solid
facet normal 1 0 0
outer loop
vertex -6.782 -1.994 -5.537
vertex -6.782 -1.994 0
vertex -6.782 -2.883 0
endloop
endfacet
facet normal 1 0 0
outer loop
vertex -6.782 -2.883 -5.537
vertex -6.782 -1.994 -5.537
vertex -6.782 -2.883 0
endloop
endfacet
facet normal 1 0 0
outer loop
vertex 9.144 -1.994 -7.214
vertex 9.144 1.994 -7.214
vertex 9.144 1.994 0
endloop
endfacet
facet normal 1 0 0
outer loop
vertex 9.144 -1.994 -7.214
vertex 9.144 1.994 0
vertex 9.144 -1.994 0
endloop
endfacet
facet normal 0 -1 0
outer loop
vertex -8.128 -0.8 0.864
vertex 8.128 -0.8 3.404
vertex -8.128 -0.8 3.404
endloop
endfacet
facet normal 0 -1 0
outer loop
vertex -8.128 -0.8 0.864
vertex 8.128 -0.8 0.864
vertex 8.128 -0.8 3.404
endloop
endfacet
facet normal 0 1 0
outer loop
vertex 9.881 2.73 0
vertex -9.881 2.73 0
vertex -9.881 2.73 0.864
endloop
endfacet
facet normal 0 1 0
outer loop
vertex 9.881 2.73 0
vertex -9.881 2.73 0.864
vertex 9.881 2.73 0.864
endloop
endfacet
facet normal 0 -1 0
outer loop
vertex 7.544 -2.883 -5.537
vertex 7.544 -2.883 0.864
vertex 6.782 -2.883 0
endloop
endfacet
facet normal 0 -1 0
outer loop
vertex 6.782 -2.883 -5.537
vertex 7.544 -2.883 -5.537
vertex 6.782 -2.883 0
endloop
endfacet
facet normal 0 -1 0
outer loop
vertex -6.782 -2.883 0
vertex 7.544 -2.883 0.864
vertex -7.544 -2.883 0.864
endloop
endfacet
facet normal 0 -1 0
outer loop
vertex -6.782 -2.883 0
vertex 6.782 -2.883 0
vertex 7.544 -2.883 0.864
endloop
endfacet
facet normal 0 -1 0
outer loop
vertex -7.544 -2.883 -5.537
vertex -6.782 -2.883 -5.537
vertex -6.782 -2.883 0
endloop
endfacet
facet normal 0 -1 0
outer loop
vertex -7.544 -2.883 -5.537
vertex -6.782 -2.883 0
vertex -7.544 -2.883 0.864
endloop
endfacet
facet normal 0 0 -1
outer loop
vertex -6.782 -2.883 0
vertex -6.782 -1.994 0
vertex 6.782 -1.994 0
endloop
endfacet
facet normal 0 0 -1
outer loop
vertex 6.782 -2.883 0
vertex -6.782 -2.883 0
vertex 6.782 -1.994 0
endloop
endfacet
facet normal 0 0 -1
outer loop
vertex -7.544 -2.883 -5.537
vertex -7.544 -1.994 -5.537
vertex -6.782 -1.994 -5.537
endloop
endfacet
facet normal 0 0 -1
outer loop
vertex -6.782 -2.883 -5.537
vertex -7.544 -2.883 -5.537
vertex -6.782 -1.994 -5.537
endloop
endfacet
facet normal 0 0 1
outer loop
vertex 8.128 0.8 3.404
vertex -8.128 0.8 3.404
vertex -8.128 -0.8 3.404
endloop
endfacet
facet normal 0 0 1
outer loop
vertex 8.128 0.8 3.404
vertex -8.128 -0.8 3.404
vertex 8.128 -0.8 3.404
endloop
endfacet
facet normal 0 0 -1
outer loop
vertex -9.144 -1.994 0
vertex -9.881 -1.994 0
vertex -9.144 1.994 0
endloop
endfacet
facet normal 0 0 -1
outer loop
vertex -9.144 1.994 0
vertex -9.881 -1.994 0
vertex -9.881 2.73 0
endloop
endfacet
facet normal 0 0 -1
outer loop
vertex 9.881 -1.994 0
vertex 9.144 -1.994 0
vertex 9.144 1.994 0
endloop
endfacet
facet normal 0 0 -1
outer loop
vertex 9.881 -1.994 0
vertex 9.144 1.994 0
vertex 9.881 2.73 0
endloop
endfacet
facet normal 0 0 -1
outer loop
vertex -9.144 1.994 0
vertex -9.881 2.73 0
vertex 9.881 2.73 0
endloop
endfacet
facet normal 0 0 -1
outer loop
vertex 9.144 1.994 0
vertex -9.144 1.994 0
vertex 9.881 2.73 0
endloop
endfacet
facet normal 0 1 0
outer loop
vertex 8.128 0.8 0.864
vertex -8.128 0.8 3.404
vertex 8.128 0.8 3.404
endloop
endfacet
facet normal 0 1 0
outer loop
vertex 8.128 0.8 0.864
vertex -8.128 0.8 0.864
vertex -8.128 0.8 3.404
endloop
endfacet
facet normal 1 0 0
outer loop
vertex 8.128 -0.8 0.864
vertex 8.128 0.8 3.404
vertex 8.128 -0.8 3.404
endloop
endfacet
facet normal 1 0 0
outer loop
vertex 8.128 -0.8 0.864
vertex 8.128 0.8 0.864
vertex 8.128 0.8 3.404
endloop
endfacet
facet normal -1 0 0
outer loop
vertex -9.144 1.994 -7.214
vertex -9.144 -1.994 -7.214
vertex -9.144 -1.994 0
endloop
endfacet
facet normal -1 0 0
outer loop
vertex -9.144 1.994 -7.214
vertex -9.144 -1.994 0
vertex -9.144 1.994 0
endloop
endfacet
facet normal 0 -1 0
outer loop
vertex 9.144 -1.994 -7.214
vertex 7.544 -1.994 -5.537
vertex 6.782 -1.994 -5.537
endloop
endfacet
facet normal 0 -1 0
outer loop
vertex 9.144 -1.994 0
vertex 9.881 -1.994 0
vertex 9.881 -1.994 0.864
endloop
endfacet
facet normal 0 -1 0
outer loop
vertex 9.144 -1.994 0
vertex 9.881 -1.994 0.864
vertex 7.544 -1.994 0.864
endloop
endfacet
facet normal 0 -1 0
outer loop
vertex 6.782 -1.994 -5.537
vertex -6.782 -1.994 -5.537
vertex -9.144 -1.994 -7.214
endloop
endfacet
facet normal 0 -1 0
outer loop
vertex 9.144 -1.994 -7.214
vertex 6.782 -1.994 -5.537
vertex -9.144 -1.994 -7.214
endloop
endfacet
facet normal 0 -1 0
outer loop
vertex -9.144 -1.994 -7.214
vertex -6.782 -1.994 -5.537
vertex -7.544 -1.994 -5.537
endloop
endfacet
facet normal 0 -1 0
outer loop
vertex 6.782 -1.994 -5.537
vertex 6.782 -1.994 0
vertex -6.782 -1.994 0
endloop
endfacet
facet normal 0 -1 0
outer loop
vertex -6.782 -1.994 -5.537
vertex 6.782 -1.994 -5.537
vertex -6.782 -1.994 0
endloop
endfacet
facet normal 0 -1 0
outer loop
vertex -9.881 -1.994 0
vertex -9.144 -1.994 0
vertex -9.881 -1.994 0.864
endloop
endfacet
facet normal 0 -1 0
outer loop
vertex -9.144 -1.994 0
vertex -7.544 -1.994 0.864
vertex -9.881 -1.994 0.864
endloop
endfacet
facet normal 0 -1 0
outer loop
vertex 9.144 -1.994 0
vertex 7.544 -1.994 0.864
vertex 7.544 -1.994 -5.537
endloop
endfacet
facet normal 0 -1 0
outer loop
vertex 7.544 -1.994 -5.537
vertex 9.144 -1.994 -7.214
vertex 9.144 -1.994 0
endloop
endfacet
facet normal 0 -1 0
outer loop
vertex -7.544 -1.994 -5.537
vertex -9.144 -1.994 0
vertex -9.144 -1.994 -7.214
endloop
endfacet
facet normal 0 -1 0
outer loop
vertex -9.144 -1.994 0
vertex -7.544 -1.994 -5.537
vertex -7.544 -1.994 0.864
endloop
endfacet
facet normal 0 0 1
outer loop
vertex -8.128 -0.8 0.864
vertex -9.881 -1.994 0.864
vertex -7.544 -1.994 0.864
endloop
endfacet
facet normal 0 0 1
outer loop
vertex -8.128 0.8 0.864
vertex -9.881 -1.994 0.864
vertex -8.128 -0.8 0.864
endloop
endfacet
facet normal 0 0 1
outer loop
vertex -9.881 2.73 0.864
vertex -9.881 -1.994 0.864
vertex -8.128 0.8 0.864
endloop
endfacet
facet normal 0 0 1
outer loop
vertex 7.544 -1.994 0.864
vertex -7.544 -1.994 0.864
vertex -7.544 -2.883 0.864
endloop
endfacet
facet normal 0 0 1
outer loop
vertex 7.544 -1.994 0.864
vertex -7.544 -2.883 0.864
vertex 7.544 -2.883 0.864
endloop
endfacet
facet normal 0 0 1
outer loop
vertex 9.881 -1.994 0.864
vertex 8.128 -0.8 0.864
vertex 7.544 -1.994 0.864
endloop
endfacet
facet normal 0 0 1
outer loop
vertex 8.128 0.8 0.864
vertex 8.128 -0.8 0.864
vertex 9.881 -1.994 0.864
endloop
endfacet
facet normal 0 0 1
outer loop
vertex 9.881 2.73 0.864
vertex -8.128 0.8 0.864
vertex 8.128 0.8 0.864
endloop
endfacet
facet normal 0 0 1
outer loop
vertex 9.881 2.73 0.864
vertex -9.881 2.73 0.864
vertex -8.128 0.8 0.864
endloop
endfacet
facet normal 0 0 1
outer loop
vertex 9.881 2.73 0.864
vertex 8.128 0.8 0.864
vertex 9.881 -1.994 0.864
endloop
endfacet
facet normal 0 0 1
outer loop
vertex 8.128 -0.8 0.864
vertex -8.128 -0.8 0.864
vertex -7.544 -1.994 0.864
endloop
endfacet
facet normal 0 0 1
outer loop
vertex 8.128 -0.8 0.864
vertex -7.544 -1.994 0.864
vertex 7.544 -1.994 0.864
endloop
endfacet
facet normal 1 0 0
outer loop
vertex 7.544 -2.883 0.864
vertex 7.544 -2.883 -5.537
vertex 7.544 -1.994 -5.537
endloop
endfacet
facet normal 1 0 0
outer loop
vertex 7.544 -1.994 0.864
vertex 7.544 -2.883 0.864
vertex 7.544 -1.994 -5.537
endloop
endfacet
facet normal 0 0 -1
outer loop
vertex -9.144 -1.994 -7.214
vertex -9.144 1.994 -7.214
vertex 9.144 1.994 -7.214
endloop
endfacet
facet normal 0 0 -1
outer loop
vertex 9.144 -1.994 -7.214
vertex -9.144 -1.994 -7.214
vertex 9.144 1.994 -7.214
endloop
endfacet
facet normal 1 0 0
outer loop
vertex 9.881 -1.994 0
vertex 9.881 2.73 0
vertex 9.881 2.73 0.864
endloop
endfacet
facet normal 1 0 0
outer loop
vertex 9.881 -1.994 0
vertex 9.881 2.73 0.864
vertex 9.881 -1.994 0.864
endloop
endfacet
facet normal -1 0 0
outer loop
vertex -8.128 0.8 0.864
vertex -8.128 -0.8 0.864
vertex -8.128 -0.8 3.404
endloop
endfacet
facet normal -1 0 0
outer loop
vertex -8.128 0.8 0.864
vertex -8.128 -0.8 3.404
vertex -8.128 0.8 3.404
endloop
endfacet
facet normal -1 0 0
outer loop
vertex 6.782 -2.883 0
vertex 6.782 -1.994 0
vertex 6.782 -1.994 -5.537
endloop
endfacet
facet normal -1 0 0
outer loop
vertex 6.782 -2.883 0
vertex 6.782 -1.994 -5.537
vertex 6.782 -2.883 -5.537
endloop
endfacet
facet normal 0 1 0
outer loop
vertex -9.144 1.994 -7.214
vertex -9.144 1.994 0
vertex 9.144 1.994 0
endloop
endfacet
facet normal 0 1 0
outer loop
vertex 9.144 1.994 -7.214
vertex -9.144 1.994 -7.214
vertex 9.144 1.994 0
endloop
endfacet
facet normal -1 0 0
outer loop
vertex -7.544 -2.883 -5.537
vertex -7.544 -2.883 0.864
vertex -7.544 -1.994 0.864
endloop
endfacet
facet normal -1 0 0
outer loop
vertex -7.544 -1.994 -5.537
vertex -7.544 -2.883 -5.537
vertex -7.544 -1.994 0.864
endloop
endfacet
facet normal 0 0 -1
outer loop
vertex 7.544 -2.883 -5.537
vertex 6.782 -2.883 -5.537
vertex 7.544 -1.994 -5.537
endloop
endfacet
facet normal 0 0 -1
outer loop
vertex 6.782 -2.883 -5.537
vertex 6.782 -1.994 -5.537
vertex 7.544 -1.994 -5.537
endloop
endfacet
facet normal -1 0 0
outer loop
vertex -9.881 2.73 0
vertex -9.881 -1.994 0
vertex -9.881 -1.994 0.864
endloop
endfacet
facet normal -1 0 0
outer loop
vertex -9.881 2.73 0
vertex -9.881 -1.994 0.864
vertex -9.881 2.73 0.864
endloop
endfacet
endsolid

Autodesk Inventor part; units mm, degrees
ref_plane "YZ Plane" through (0, 0, 0) normal (1, 0, 0) x (0, 1, 0)
ref_plane "XZ Plane" through (0, 0, 0) normal (0, 1, 0) x (-1, 0, 0)
ref_plane "XY Plane" through (0, 0, 0) normal (0, 0, 1) x (1, 0, 0)
sketch "Sketch1" plane through (0, 0, 0) normal (0, 0, 1) x (1, 0, 0)
  line L0 (-9.144, 1.9939) -> (9.144, 1.9939)
  line L1 (9.144, 1.9939) -> (9.144, -1.9939)
  line L2 (9.144, -1.9939) -> (-9.144, -1.9939)
  line L3 (-9.144, -1.9939) -> (-9.144, 1.9939)
  line L4 (-9.144, 1.9939) -> (9.144, -1.9939) construction
  line L5 (9.144, 1.9939) -> (-9.144, -1.9939) construction
  line L6 (-9.8806, 2.7305) -> (9.8806, 2.7305)
  line L7 (9.8806, 2.7305) -> (9.8806, -1.9939)
  line L8 (9.8806, -1.9939) -> (-9.8806, -1.9939)
  line L9 (-9.8806, -1.9939) -> (-9.8806, 2.7305)
  line L10 (-7.5438, -1.9939) -> (-6.7818, -1.9939)
  line L11 (-6.7818, -1.9939) -> (-6.7818, -2.8829)
  line L12 (-6.7818, -2.8829) -> (-7.5438, -2.8829)
  line L13 (-7.5438, -2.8829) -> (-7.5438, -1.9939)
  line L14 (-7.5438, -2.8829) -> (7.5438, -2.8829)
  line L15 (7.5438, -2.8829) -> (7.5438, -1.9939)
  line L16 (7.5438, -1.9939) -> (-7.5438, -1.9939)
  line L17 (-7.5438, -1.9939) -> (-7.5438, -2.8829)
  line L18 (7.5438, -1.9939) -> (6.7818, -1.9939)
  line L19 (6.7818, -1.9939) -> (6.7818, -2.8829)
  line L20 (6.7818, -2.8829) -> (7.5438, -2.8829)
  line L21 (7.5438, -2.8829) -> (7.5438, -1.9939)
  line L22 (0, 0) -> (0, -2.8829) construction
  dimension "d0" = 18.288
  dimension "d1" = 3.9878
  dimension "d4" = 0.7366
  dimension "d6" = 0.7366
  dimension "d7" = 0.7366
  dimension "d14" = 0.762
  dimension "d16" = 0.889
  dimension "d17" = 13.5636
extrude "Extrusion1" add sketch "Sketch1" against normal blind 7.2136 contours L0 L1 L2 L3
extrude "Extrusion2" add sketch "Sketch1" along normal blind 0.8636
sketch "Sketch2" plane through (0, 0, 0.8636) normal (0, 0, 1) x (1, 0, 0)
  line L0 (-8.128, 0.8001) -> (8.128, 0.8001)
  line L1 (8.128, 0.8001) -> (8.128, -0.8001)
  line L2 (8.128, -0.8001) -> (-8.128, -0.8001)
  line L3 (-8.128, -0.8001) -> (-8.128, 0.8001)
  line L4 (8.128, 0.8001) -> (-8.128, -0.8001) construction
  point P0 (0, 0)
  point P1 (0, 0)
  dimension "d10" = 16.256
  dimension "d11" = 1.6002
extrude "Extrusion3" add sketch "Sketch2" along normal blind 2.54
extrude "Extrusion4" add sketch "Sketch1" against normal blind 5.5372 contours L2 L11 L12 L13 | L15 L14 L19 L2
properties part number "jst-xh 7c"
